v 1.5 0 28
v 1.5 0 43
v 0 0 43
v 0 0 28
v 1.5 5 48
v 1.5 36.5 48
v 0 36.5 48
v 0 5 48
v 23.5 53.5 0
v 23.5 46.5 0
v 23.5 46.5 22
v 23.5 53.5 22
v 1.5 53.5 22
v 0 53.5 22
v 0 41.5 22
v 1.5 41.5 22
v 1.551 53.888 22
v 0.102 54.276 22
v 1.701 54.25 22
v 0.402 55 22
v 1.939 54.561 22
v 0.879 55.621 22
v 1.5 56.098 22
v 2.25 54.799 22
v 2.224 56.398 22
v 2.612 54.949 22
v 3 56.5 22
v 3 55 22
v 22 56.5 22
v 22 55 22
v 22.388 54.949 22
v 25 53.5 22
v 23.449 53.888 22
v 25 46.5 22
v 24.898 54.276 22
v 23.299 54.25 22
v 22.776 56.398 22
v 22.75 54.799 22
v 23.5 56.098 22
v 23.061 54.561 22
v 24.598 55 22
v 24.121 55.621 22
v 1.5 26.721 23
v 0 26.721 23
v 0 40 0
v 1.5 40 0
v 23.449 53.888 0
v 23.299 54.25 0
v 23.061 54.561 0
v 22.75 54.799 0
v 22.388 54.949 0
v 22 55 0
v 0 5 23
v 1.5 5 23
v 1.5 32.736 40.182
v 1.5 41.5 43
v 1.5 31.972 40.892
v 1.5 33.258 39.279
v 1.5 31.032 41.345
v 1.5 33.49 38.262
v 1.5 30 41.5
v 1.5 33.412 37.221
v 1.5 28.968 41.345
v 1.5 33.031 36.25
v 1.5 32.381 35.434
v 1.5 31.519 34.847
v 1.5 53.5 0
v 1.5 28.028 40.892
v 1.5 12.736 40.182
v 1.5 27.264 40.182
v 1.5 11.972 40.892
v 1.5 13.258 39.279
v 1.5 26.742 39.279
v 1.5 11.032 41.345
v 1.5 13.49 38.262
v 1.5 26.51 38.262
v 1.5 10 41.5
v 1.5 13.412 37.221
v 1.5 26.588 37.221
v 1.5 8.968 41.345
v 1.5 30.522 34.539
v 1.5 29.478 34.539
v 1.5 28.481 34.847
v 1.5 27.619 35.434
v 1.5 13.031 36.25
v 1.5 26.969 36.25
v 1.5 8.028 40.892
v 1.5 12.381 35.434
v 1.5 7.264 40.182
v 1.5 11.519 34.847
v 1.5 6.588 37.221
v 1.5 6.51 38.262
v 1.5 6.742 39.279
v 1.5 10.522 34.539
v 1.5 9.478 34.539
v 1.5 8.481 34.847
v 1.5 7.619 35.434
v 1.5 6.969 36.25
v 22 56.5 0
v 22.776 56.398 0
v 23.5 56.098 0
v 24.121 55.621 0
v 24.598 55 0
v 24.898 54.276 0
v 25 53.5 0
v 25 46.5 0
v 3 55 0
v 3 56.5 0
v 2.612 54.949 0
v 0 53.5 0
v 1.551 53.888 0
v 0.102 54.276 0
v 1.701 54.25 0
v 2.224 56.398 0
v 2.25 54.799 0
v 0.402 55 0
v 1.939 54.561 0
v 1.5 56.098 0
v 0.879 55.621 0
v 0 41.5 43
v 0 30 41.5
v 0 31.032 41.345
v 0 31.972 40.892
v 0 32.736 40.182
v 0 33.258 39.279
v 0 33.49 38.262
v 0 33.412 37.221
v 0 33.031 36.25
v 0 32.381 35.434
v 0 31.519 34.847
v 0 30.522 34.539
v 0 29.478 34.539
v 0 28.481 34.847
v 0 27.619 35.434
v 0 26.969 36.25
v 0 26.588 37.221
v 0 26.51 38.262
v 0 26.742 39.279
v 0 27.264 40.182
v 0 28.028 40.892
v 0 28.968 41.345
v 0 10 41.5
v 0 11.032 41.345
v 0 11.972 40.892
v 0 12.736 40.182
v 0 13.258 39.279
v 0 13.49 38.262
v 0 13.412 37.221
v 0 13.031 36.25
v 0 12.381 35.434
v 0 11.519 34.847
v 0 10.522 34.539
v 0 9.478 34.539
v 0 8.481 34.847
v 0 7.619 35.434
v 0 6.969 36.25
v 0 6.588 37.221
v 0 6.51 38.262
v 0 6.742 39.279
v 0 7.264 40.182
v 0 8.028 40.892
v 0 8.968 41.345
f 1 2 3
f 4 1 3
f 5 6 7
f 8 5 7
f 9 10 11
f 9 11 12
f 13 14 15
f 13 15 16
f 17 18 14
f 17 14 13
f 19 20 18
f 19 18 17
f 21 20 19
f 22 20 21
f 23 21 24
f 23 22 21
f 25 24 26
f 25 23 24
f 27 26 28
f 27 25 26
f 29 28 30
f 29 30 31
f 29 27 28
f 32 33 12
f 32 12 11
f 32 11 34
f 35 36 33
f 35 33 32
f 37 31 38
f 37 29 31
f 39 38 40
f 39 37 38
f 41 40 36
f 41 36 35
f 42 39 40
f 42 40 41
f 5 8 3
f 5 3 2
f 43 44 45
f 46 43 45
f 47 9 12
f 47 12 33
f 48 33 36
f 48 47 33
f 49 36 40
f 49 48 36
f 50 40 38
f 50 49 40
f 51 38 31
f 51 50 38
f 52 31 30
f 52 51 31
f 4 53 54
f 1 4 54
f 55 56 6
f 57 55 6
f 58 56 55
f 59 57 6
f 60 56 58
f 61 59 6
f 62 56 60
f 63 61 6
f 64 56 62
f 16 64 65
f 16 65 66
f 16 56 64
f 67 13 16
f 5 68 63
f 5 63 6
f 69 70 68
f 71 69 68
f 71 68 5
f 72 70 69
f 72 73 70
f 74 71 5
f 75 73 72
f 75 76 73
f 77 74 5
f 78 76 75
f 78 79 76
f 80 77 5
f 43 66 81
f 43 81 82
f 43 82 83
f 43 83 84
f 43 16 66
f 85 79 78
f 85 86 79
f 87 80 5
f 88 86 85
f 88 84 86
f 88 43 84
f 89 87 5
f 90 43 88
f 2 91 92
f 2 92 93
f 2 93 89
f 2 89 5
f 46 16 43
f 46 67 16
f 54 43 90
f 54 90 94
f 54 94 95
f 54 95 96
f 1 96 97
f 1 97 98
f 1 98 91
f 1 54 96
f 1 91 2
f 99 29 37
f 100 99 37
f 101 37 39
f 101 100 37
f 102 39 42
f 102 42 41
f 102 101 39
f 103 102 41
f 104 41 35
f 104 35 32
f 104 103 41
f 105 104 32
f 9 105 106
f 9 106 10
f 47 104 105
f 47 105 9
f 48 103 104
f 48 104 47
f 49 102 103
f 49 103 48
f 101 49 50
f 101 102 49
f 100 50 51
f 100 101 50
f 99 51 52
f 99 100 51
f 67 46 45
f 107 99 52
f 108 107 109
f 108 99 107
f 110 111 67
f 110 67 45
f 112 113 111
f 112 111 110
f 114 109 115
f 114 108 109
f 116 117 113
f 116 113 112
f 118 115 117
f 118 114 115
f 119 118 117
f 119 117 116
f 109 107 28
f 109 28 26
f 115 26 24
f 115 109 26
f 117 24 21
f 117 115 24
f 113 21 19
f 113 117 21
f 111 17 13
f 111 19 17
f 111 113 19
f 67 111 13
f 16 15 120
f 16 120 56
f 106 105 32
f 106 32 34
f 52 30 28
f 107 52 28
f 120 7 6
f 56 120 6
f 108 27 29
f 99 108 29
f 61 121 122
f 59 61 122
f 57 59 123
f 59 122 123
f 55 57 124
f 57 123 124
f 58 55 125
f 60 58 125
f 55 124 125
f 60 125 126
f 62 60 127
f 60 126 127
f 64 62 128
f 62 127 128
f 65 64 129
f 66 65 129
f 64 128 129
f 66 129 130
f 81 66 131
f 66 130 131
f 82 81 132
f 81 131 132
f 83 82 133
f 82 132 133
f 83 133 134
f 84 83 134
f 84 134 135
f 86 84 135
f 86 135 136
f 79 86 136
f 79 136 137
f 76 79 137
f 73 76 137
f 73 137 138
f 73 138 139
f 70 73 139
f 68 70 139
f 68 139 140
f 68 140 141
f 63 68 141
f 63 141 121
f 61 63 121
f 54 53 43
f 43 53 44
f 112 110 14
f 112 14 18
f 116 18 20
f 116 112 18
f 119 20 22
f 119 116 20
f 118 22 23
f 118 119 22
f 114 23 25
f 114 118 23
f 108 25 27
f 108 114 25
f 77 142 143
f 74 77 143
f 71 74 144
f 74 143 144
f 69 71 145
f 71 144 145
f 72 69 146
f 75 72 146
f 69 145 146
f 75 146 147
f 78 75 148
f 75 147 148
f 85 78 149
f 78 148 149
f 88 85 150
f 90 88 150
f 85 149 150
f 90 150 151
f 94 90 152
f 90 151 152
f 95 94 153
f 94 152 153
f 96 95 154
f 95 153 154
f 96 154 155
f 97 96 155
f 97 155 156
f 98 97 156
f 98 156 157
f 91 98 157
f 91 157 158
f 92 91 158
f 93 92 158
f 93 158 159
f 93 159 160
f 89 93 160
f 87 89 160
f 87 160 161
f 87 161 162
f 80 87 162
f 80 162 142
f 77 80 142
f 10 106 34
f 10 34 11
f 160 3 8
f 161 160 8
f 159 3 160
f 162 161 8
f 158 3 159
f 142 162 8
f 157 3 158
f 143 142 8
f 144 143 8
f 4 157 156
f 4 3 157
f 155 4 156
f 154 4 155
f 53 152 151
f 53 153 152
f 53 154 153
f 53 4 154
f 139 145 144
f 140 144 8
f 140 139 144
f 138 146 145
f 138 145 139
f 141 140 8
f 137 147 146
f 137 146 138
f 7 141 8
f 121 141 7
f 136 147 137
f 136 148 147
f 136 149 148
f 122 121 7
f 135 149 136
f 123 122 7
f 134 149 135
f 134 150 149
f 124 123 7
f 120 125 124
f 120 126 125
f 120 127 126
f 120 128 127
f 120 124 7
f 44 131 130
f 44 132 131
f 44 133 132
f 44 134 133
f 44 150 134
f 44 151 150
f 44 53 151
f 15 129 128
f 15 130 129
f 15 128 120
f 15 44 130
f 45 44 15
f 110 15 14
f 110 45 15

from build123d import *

# Parameters (mm, degrees)
SM_BASE_FLANGE_1_DEPTH = 48
CUT_EXTRUDE_1_DEPTH    = 10
SKETCH_10_R            = 3.5
CUT_EXTRUDE_2_DEPTH    = 10
SKETCH_11_W            = 30
SKETCH_11_H            = 26
CUT_EXTRUDE_3_DEPTH    = 15
OTHER_START            = 16.263455967
OTHER_1_OUTLINE_W      = 4
OTHER_1_OUTLINE_H      = 30.405591591
OTHER_1_DEPTH          = 3.535533906
OTHER_START_2          = 59.75052301
OTHER_1_2_OUTLINE_W    = 4
OTHER_1_2_OUTLINE_H    = 30.405591591
OTHER_1_2_DEPTH        = 3.535533906
OTHER_START_3          = 30.405591591
OTHER_1_3_OUTLINE_W    = 4
OTHER_1_3_OUTLINE_H    = 3.594408409
OTHER_1_3_DEPTH        = 7.071067812


# Read off the part's stored shape, not the designer's step: Затупленный угол1
# Sheet-metal steps are written as plain solids
with BuildPart() as part:
    # Sketch 2 → Базовая кромка1 (new body)
    with BuildSketch(Plane.XY):
        with BuildLine():
            Line((0, 0), (0, 53.5))
            ThreePointArc((0, 53.5), (0.878679656, 55.621320344), (3, 56.5))
            Line((3, 56.5), (22, 56.5))
            ThreePointArc((22, 56.5), (24.121320344, 55.621320344), (25, 53.5))
            Line((25, 53.5), (25, 46.5))
            Line((25, 46.5), (23.5, 46.5))
            Line((23.5, 46.5), (23.5, 53.5))
            ThreePointArc((23.5, 53.5), (23.060660172, 54.560660172), (22, 55))
            Line((22, 55), (3, 55))
            ThreePointArc((3, 55), (1.939339828, 54.560660172), (1.5, 53.5))
            Line((1.5, 53.5), (1.5, 0))
            Line((1.5, 0), (0, 0))
        make_face()
    extrude(amount=SM_BASE_FLANGE_1_DEPTH)

    # Эскиз7 → Вырез-Вытянуть1 (cut)
    with BuildSketch(Plane.ZY):
        Polygon((23, 0), (23, 26.720943809), (0, 40), (0, 0), align=None)
    extrude(amount=-CUT_EXTRUDE_1_DEPTH, mode=Mode.SUBTRACT)

    # Эскиз10 → Вырез-Вытянуть2 (cut)
    with BuildSketch(Plane.ZY):
        with Locations((38, 10)):
            Circle(SKETCH_10_R)
        with Locations((38, 30)):
            Circle(SKETCH_10_R)
    extrude(amount=-CUT_EXTRUDE_2_DEPTH, mode=Mode.SUBTRACT)

    # Эскиз11 → Вырез-Вытянуть3 (cut)
    with BuildSketch(Plane(origin=(0, 56.5, 0), x_dir=(1, 0, 0), z_dir=(0, 1, 0))):
        with Locations((11, -35)):
            Rectangle(SKETCH_11_W, SKETCH_11_H)
    extrude(amount=-CUT_EXTRUDE_3_DEPTH, mode=Mode.SUBTRACT)

    # Other 1 outline → Other 1 (cut)
    with BuildSketch(Plane(origin=(0, 0, 0), x_dir=(1, 0, 0), z_dir=(0, 0.707106781186547, 0.707106781186548)).offset(OTHER_START)):
        with Locations((1, -15.202795796)):
            Rectangle(OTHER_1_OUTLINE_W, OTHER_1_OUTLINE_H)
    extrude(amount=OTHER_1_DEPTH, mode=Mode.SUBTRACT)

    # Other 1 2 outline → Other 1 2 (cut)
    with BuildSketch(Plane(origin=(0, 0, 0), x_dir=(1, 0, 0), z_dir=(0, 0.707106781186547, 0.707106781186548)).offset(OTHER_START_2)):
        with Locations((1, -15.202795796)):
            Rectangle(OTHER_1_2_OUTLINE_W, OTHER_1_2_OUTLINE_H)
    extrude(amount=OTHER_1_2_DEPTH, mode=Mode.SUBTRACT)

    # Other 1 3 outline → Other 1 3 (cut)
    with BuildSketch(Plane(origin=(0, 0, 0), x_dir=(1, 0, 0), z_dir=(0, 0.707106781186547, 0.707106781186548)).offset(OTHER_START_3)):
        with Locations((1, -32.202795796)):
            Rectangle(OTHER_1_3_OUTLINE_W, OTHER_1_3_OUTLINE_H)
    extrude(amount=OTHER_1_3_DEPTH, mode=Mode.SUBTRACT)


solid = part.part
